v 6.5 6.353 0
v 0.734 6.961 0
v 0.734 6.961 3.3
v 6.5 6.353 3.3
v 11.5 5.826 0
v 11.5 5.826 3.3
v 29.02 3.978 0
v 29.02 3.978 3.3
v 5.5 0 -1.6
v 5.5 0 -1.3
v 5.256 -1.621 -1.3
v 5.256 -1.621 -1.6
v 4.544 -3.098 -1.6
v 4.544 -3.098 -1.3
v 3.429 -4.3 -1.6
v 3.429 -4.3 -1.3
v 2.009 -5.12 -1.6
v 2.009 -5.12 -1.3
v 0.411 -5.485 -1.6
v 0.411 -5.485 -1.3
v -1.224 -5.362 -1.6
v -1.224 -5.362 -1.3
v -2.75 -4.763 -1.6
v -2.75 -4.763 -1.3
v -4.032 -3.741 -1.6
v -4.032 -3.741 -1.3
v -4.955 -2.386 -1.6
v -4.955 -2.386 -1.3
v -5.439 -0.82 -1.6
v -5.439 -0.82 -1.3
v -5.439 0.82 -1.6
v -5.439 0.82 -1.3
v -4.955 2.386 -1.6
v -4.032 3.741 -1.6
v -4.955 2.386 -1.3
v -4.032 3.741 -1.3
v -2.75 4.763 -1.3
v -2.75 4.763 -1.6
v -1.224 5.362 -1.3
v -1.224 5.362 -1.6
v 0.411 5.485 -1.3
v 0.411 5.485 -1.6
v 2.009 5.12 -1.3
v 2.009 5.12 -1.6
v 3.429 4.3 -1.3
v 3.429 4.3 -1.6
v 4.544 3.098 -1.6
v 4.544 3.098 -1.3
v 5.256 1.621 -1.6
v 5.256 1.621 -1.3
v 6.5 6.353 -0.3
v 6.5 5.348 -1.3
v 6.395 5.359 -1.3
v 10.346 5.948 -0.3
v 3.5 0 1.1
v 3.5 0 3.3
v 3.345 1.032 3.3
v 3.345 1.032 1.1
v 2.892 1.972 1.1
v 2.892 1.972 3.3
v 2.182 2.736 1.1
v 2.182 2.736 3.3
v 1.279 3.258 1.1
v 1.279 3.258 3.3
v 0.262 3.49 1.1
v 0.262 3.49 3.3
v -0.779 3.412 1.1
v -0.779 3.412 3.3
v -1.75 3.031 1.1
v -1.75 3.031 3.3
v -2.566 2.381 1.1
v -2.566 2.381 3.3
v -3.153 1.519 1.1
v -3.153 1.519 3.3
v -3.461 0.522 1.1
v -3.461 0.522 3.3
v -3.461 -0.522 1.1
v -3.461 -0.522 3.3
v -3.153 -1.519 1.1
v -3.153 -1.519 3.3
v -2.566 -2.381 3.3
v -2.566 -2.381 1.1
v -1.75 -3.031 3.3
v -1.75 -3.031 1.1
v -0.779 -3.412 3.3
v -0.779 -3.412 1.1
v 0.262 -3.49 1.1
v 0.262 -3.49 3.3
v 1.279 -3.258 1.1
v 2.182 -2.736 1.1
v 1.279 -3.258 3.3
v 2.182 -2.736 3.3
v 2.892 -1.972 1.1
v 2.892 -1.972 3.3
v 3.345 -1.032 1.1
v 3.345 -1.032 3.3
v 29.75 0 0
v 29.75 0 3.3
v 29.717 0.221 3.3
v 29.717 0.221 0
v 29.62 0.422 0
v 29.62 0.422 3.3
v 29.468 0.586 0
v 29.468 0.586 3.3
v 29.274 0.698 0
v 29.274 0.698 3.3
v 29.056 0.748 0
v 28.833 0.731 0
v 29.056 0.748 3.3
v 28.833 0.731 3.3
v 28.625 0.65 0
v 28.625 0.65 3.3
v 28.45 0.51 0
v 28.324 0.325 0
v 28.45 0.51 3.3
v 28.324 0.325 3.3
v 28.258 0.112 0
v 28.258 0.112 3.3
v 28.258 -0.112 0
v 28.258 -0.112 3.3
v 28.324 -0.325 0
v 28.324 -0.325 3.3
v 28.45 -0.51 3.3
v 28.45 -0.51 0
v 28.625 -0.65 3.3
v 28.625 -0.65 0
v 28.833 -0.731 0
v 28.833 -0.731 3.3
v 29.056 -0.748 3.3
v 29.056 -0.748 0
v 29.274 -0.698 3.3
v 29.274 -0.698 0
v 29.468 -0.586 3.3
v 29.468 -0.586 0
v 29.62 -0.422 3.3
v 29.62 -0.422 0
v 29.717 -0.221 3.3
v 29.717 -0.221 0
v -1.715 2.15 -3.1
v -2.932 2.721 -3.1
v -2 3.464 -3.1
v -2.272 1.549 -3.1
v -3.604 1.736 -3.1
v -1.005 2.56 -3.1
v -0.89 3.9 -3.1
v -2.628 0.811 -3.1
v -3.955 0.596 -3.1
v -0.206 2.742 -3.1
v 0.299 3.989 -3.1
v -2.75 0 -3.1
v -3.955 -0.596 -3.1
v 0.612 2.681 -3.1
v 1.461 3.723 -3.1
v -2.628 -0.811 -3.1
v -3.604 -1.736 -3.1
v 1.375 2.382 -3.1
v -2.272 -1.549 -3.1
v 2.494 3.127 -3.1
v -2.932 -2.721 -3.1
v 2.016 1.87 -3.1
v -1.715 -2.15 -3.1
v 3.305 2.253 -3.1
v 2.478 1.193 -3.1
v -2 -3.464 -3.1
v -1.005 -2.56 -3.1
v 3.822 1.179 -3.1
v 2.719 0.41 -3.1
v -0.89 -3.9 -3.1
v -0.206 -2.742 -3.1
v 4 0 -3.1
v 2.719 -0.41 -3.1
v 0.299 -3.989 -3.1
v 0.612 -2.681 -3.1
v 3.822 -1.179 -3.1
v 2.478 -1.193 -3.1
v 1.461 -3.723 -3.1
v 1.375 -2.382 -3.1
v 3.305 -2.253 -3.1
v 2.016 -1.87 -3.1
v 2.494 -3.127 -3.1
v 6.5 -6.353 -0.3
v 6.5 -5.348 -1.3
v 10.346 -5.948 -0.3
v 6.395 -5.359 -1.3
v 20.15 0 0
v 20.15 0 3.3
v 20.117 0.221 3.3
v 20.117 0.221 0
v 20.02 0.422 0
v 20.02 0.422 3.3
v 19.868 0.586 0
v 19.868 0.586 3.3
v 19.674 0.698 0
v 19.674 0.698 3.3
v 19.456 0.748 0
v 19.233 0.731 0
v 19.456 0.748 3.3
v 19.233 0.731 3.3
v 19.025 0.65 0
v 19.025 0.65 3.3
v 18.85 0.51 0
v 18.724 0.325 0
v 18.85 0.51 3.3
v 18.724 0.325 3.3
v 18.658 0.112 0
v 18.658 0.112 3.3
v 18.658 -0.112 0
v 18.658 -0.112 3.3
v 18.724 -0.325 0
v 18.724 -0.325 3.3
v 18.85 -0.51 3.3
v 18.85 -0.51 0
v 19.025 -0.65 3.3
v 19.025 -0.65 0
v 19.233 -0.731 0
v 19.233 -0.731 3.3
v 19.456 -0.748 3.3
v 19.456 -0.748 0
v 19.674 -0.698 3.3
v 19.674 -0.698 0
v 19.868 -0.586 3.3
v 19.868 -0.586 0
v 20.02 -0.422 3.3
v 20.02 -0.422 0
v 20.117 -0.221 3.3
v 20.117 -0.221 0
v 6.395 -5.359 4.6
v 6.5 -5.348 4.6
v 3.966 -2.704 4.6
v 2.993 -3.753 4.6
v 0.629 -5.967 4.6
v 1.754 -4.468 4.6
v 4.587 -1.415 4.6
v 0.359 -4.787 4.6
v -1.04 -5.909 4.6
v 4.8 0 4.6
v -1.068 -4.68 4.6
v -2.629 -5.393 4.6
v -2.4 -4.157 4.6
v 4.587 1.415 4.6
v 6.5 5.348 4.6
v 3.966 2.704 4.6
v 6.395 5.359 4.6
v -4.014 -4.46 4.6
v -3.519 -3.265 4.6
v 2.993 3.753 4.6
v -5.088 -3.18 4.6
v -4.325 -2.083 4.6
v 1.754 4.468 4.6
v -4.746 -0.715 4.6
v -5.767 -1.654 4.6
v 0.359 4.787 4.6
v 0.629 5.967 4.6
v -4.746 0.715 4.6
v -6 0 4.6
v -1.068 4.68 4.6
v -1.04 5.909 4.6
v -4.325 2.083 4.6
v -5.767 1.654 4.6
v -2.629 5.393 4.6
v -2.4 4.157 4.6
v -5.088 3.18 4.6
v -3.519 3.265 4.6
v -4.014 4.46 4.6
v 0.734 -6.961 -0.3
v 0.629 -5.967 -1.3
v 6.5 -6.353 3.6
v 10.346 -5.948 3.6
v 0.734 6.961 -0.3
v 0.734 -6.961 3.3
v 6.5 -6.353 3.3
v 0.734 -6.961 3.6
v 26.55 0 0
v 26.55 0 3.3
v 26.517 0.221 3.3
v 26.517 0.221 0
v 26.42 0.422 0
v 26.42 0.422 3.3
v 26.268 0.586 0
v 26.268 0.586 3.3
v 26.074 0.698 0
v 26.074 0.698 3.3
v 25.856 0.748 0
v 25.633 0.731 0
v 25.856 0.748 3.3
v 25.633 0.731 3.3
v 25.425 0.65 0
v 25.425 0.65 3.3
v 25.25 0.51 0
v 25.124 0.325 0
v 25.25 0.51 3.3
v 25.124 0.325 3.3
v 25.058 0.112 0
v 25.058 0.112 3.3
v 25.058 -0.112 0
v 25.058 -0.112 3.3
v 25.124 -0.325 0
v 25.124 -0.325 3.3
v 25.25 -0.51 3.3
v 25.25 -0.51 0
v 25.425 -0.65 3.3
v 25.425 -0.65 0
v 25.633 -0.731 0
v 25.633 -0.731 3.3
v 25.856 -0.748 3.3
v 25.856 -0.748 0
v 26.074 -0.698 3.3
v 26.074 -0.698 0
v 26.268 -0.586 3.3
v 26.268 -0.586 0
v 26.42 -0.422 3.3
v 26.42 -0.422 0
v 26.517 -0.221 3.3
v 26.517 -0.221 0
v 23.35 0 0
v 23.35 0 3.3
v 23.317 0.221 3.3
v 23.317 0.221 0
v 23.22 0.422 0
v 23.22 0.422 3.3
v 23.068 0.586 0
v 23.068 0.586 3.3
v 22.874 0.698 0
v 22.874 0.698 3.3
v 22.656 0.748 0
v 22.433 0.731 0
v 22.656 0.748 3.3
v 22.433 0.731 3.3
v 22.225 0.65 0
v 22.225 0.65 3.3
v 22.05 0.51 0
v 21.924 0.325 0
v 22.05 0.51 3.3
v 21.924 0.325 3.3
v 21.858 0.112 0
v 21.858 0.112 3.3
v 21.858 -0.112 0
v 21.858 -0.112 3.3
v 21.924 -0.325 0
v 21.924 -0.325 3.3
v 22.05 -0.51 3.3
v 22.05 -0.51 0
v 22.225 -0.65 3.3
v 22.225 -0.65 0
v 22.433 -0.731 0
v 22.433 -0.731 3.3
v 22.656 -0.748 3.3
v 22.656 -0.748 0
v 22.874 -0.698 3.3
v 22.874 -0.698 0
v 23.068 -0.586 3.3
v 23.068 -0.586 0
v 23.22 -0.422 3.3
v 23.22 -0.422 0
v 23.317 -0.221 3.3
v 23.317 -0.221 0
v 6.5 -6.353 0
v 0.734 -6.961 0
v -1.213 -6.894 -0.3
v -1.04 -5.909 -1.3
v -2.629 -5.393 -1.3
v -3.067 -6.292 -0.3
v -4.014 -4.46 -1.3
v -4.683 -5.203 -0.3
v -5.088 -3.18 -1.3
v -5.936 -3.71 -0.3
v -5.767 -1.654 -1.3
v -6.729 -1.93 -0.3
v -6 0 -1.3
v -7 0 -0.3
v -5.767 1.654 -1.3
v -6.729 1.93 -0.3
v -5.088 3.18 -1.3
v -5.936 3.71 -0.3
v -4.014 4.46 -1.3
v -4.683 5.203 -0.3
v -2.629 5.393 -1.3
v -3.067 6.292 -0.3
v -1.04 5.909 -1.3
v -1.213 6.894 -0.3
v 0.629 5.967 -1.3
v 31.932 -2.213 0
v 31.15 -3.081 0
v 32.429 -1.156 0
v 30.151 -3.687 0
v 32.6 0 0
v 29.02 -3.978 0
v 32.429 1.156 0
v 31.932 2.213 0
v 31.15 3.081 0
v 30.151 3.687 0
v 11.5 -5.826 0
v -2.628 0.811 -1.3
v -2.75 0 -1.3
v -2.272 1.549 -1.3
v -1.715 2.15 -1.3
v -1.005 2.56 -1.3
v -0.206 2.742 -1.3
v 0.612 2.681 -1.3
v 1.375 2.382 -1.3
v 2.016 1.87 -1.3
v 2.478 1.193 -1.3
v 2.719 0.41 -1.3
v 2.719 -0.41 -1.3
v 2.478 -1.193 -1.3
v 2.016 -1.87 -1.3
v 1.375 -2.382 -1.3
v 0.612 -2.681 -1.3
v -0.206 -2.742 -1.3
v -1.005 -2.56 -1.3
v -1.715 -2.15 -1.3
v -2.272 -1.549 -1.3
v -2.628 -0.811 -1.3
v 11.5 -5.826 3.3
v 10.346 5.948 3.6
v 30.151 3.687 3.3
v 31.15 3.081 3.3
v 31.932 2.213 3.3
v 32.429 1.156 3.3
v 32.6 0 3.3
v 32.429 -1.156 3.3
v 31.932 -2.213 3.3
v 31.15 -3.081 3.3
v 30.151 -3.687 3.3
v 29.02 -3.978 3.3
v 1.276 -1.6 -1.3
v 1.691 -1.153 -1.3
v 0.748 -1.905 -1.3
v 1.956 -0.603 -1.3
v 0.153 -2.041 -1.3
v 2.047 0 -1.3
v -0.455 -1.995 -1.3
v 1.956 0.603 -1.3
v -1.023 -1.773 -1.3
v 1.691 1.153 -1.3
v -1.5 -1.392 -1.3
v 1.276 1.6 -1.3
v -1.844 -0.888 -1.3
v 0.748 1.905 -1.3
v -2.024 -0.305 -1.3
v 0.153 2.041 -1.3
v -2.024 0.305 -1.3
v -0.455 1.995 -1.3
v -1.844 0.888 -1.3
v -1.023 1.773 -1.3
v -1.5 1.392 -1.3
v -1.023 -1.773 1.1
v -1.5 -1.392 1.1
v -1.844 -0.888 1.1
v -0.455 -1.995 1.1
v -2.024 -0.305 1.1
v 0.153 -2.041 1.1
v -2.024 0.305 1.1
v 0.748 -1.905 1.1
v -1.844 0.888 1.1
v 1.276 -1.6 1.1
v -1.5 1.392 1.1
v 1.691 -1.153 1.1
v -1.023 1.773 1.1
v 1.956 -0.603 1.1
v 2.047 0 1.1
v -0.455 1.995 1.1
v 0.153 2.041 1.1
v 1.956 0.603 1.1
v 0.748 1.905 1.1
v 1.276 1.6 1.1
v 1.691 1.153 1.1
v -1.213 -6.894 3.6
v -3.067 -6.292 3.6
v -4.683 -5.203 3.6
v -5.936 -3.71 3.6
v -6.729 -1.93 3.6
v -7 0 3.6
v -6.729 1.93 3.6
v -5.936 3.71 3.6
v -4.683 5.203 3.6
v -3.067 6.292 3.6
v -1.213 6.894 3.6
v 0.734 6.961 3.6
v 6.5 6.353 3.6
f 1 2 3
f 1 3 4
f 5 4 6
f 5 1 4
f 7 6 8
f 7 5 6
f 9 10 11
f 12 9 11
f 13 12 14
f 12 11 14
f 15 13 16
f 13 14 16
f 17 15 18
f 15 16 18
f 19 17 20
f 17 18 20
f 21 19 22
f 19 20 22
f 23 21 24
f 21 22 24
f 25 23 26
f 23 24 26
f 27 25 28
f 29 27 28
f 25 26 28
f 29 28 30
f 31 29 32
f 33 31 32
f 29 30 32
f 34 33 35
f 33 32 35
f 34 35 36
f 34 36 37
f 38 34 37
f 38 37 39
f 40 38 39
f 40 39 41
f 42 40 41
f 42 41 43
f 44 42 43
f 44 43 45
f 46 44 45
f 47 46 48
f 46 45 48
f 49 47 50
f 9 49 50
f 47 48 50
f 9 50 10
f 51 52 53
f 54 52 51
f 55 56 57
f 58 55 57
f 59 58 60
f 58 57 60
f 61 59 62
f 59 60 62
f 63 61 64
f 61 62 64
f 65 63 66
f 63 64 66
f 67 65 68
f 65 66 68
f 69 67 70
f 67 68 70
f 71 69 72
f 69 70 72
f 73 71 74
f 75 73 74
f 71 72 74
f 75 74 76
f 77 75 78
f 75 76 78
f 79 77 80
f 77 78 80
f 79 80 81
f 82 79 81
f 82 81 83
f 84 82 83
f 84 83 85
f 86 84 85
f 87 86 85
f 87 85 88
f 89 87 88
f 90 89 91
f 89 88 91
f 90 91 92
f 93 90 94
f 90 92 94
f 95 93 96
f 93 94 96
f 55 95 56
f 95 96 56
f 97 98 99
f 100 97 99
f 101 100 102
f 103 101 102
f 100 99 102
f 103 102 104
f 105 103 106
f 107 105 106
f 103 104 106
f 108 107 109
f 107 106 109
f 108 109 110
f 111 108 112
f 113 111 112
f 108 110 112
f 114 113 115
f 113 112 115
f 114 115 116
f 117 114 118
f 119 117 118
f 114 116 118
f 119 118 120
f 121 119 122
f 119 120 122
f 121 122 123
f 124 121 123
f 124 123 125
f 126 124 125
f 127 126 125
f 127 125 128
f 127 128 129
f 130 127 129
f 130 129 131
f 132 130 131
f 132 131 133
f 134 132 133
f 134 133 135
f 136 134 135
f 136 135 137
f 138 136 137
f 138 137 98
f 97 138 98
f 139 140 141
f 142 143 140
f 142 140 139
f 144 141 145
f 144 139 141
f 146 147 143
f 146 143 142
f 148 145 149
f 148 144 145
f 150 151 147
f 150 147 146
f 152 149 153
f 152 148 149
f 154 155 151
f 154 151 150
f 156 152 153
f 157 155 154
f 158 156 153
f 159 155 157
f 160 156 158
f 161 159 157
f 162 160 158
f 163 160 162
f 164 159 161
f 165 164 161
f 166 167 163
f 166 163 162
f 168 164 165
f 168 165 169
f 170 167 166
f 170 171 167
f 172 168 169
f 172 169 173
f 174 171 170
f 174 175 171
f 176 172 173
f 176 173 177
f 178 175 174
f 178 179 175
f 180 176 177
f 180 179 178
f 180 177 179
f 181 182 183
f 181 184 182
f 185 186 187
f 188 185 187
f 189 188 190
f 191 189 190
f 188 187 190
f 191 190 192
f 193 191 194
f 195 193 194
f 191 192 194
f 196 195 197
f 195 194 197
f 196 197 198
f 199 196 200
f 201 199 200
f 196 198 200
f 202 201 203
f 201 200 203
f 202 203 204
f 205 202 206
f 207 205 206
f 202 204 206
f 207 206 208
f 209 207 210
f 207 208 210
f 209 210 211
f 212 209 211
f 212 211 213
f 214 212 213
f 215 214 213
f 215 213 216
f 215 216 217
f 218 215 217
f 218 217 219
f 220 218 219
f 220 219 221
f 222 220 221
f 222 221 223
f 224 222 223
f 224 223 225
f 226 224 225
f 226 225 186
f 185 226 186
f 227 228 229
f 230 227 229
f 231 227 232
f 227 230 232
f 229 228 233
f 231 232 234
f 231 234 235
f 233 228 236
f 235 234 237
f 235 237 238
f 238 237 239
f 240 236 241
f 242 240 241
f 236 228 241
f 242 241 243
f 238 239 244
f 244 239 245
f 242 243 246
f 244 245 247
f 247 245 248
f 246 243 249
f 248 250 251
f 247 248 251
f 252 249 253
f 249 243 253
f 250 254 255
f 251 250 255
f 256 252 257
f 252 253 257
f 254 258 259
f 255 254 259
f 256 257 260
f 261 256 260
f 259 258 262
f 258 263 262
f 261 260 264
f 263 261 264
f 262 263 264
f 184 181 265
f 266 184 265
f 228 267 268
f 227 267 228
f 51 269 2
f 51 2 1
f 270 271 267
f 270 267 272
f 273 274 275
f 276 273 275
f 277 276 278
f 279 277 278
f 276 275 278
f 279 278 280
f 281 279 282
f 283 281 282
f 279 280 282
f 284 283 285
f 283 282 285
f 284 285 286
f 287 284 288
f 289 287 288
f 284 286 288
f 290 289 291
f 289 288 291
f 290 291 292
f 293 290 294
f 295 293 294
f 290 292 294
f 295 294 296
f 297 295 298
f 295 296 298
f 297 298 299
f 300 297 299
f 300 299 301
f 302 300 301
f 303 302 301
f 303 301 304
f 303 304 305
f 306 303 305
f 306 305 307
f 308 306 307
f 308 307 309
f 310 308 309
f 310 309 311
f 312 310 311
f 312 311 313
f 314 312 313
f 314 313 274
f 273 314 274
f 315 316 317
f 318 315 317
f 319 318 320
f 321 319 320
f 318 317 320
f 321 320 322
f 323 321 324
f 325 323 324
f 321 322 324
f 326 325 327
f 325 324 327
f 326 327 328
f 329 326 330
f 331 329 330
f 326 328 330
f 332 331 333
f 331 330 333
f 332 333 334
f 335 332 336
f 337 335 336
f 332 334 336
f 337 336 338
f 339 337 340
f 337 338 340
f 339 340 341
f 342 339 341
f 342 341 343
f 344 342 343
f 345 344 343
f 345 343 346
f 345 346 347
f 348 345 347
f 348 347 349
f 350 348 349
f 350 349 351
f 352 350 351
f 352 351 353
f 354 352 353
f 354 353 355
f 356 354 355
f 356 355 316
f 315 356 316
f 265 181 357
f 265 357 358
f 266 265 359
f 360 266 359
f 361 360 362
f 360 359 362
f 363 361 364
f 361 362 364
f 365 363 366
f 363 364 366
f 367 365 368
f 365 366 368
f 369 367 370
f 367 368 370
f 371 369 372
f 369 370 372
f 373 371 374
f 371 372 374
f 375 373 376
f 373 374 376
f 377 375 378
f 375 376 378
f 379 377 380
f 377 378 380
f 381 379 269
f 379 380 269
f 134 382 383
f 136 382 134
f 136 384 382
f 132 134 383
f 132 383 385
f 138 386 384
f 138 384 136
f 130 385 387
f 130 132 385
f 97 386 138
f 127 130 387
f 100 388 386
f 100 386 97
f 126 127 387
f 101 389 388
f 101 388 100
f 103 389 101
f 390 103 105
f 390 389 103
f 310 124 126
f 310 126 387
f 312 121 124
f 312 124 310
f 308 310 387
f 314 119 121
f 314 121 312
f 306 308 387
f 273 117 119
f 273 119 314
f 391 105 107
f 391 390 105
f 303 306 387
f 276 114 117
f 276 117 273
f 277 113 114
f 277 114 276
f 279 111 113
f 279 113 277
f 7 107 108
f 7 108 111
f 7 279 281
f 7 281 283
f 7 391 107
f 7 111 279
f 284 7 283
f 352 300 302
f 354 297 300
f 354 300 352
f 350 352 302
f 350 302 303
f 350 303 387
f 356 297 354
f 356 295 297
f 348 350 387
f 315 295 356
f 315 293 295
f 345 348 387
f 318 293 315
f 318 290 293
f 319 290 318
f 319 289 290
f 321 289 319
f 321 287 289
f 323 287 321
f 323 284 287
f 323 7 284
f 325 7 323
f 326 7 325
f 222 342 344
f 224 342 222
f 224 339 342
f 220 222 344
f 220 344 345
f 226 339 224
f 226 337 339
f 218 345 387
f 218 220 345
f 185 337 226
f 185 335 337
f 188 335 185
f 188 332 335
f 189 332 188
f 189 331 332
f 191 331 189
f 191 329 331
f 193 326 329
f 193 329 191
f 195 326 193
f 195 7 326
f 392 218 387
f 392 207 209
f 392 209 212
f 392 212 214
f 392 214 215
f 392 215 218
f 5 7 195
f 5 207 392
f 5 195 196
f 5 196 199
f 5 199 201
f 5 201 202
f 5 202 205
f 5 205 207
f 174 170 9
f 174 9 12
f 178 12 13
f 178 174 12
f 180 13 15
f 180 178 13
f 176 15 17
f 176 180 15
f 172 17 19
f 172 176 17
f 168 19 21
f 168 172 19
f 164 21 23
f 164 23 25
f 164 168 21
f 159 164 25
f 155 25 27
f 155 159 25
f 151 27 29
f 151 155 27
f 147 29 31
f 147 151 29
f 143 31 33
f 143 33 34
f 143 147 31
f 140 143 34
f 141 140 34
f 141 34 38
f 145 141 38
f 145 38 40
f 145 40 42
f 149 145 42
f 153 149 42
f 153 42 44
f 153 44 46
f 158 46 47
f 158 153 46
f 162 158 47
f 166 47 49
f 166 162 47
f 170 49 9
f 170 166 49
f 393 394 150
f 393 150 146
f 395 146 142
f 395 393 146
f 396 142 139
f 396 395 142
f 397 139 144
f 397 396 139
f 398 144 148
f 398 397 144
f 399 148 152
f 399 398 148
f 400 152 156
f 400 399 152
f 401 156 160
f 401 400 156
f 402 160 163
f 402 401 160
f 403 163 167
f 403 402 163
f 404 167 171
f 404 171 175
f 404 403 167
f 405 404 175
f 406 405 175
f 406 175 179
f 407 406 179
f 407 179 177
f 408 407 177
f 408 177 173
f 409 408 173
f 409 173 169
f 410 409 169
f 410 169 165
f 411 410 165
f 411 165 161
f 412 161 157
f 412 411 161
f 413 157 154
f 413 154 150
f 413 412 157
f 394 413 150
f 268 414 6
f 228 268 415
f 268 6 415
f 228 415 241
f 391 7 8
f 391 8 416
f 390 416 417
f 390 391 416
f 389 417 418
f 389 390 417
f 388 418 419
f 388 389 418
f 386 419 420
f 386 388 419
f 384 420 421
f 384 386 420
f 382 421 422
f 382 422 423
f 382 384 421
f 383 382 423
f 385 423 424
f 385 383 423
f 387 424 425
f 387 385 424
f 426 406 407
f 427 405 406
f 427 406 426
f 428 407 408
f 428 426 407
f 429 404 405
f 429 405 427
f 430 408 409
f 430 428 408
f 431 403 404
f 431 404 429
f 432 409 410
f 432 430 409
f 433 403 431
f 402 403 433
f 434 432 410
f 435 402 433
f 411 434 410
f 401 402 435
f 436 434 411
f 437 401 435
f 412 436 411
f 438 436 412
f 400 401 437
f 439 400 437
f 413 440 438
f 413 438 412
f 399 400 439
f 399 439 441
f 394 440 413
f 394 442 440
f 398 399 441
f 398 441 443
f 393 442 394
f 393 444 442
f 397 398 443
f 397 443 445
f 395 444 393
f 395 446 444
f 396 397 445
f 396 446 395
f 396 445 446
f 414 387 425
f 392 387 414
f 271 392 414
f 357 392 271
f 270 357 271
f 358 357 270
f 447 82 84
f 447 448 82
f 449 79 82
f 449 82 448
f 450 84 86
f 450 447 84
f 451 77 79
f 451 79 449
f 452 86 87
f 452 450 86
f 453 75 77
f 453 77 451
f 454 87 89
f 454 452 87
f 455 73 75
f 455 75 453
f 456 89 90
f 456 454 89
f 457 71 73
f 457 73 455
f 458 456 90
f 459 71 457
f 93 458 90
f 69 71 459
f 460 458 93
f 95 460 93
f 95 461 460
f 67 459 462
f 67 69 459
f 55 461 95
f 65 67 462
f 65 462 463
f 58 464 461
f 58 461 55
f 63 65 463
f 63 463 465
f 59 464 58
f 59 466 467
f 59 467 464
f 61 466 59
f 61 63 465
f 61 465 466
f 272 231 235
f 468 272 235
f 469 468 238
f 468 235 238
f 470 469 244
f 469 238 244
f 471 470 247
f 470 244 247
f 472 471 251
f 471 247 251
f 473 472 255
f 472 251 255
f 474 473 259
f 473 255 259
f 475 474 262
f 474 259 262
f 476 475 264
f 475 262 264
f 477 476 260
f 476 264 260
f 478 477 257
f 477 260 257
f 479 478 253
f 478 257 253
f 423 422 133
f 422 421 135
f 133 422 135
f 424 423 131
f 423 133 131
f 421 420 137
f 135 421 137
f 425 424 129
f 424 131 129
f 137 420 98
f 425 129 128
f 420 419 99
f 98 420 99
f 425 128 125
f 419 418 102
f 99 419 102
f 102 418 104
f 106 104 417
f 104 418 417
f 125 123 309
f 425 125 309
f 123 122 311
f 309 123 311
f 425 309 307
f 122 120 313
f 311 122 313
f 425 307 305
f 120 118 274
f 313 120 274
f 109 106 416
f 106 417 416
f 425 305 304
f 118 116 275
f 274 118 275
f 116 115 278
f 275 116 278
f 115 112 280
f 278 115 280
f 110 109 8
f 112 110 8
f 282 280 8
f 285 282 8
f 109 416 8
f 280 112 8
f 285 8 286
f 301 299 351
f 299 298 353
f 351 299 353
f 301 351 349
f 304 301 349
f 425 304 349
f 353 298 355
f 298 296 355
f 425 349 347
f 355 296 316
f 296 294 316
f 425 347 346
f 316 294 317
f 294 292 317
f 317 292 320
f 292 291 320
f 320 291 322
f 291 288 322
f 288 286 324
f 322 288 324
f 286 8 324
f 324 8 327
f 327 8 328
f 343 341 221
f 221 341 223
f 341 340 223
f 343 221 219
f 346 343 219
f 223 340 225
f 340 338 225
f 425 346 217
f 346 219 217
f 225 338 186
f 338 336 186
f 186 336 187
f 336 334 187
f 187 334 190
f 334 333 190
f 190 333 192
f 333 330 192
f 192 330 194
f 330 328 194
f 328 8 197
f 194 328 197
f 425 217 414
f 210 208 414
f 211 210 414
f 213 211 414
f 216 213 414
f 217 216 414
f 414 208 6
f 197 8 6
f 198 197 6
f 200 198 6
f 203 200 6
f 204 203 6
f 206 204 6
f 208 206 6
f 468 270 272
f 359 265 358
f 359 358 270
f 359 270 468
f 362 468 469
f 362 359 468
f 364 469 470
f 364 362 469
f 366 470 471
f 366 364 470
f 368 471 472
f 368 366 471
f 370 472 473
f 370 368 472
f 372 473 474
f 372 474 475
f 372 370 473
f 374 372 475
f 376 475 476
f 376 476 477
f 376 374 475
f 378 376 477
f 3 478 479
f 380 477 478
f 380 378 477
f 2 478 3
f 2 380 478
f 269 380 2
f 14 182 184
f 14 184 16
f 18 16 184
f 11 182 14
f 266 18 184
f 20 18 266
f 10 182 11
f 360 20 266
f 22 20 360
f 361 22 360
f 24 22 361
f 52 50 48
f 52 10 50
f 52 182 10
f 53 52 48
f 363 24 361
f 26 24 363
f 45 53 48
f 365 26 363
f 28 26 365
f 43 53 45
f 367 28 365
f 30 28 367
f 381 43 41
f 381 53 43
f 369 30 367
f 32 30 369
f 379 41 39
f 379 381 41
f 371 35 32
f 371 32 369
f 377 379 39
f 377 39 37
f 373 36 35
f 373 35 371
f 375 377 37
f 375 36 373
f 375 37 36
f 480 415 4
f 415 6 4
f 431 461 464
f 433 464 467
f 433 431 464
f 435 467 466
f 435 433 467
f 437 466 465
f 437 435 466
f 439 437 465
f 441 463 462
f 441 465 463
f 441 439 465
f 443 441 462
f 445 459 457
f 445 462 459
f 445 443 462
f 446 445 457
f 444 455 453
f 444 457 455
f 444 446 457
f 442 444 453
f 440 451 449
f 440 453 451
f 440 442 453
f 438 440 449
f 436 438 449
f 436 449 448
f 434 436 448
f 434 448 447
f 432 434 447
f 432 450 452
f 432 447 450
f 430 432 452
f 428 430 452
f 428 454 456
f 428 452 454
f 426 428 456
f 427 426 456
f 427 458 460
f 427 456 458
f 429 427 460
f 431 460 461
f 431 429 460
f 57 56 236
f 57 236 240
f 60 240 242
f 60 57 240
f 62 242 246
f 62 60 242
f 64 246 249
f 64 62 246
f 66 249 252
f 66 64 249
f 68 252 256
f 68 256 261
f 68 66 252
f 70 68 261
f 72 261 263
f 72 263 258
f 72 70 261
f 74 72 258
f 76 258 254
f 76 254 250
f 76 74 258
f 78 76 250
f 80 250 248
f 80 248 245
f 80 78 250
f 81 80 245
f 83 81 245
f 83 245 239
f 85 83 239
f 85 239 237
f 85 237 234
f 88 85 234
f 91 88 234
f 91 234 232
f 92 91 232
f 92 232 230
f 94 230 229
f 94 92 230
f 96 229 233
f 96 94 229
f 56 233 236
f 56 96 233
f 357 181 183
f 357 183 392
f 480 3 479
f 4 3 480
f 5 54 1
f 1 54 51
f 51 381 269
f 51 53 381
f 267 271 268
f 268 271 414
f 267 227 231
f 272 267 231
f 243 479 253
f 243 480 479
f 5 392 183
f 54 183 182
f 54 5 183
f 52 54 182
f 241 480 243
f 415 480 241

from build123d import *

# Parameters (mm, degrees)
ESQUISSE1_R             = 2.046773471
BOSS_EXTRU_1_DEPTH      = 3.3
BOSS_EXTRU_2_DEPTH      = 1.3
BOSS_EXTRU_2_DEPTH_BACK = 4.6
ESQUISSE2_R             = 2.046773471
CHANFREIN1_SIZE         = 5
CHANFREIN1_SIZE_2       = 1.3
CHANFREIN3_SIZE         = 5
CHANFREIN3_SIZE_2       = 1.3
CHANFREIN2_SIZE         = 1
ESQUISSE3_R             = 5.5
ESQUISSE3_R_2           = 2.75
BOSS_EXTRU_3_DEPTH      = 1.8
CHANFREIN4_SIZE         = 1.5
ESQUISSE4_R             = 3.5
ENL_V_MAT_EXTRU_1_DEPTH = 3.5
CHANFREIN5_SIZE         = 1.3
ESQUISSE5_R             = 0.75
ENL_V_MAT_EXTRU_2_DEPTH = 3.5


with BuildPart() as part:
    # Esquisse1 → Boss.-Extru.1 (new body)
    with BuildSketch(Plane.XY):
        with BuildLine():
            Line((0.734265734, 6.96138304), (29.01958042, 3.977933166))
            ThreePointArc((29.01958042, 3.977933166), (32.6, 0), (29.01958042, -3.977933166))
            Line((29.01958042, -3.977933166), (0.734265734, -6.96138304))
            ThreePointArc((0.734265734, -6.96138304), (-7, 0), (0.734265734, 6.96138304))
        make_face()
        Circle(ESQUISSE1_R, mode=Mode.SUBTRACT)
    extrude(amount=BOSS_EXTRU_1_DEPTH)

    # Esquisse2 → Boss.-Extru.2 (add, two sides: drawn at the far end of the back side and taken through both)
    with BuildSketch(Plane.XY.offset(3.3).offset(-BOSS_EXTRU_2_DEPTH_BACK)):
        with BuildLine():
            Line((0.734265734, 6.96138304), (6.5, 6.353230741))
            Line((6.5, 6.353230741), (6.5, -6.353230741))
            Line((6.5, -6.353230741), (0.734265734, -6.96138304))
            ThreePointArc((0.734265734, -6.96138304), (-7, 0), (0.734265734, 6.96138304))
        make_face()
        Circle(ESQUISSE2_R, mode=Mode.SUBTRACT)
    extrude(amount=BOSS_EXTRU_2_DEPTH + BOSS_EXTRU_2_DEPTH_BACK)

    # Chanfrein1
    # the kernel refuses this chamfer: 5, 1.3 mm, written as the material it adds along each edge
    with BuildSketch(Plane(origin=(6.5, 19.337751576, 3.3), x_dir=(0.9999530531472482, 0, -0.009689762716214913), z_dir=(0, -1, 0))) as chanfrein1_piece_1_section:
        Polygon((CHANFREIN1_SIZE * 0.999953053147, CHANFREIN1_SIZE * 0.00968976271621), (-CHANFREIN1_SIZE_2 * 0.00968976271621, CHANFREIN1_SIZE_2 * 0.999953053147), (0, 0), align=None)
    chanfrein1_piece_1 = extrude(amount=38.675503153, mode=Mode.PRIVATE)
    chanfrein1_piece_1 = split(chanfrein1_piece_1, bisect_by=Plane(origin=(8.862365218, 6.104055566, 3.683257133), z_dir=(-0.10489510489510492, -0.994483291447898, 0)), keep=Keep.TOP, mode=Mode.PRIVATE)
    chanfrein1_piece_1 = split(chanfrein1_piece_1, bisect_by=Plane(origin=(8.862365218, -6.104055566, 3.683257133), z_dir=(-0.10489510489510483, 0.9944832914478982, 0)), keep=Keep.TOP, mode=Mode.PRIVATE)
    chanfrein1_piece_1 = split(chanfrein1_piece_1, bisect_by=Plane(origin=(8.218527805, 0, 4.6), z_dir=(0, 0, -1)), keep=Keep.TOP, mode=Mode.PRIVATE)
    add(chanfrein1_piece_1)

    # Chanfrein3
    # the kernel refuses this chamfer: 5, 1.3 mm, written as the material it adds along each edge
    with BuildSketch(Plane(origin=(6.5, 19.337751576, 0), x_dir=(0.9999530531472482, 0, 0.009689762716214958), z_dir=(0, -1, 0))) as chanfrein3_piece_1_section:
        Polygon((CHANFREIN3_SIZE * 0.999953053147, -CHANFREIN3_SIZE * 0.00968976271621), (-CHANFREIN3_SIZE_2 * 0.00968976271621, -CHANFREIN3_SIZE_2 * 0.999953053147), (0, 0), align=None)
    chanfrein3_piece_1 = extrude(amount=38.675503153, mode=Mode.PRIVATE)
    chanfrein3_piece_1 = split(chanfrein3_piece_1, bisect_by=Plane(origin=(8.862365218, 6.104055566, -0.383257133), z_dir=(-0.10489510489499053, -0.9944832914479101, 0)), keep=Keep.TOP, mode=Mode.PRIVATE)
    chanfrein3_piece_1 = split(chanfrein3_piece_1, bisect_by=Plane(origin=(8.862365218, -6.104055566, -0.383257133), z_dir=(-0.10489510489499053, 0.9944832914479101, 0)), keep=Keep.TOP, mode=Mode.PRIVATE)
    chanfrein3_piece_1 = split(chanfrein3_piece_1, bisect_by=Plane(origin=(8.218527805, 0, -1.3), z_dir=(0, 0, 1)), keep=Keep.TOP, mode=Mode.PRIVATE)
    add(chanfrein3_piece_1)

    # Chanfrein2
    chanfrein2_edges = [part.edges().sort_by_distance(p)[0] for p in [
        (-7, 0, -1.3),
        (3.617132867, 6.65730689, -1.3),
        (3.617132867, -6.65730689, -1.3),
        (-7, 0, 4.6),
        (3.617132867, -6.65730689, 4.6),
        (3.617132867, 6.65730689, 4.6),
    ]]
    chamfer(chanfrein2_edges, length=CHANFREIN2_SIZE)

    # Esquisse3 → Boss.-Extru.3 (add)
    with BuildSketch(Plane(origin=(0, 0, -1.3), x_dir=(-1, 0, 0), z_dir=(0, 0, -1))):
        with Locations(Location((0, 0, 0), (0, 0, 180))):
            Circle(ESQUISSE3_R)
        Circle(ESQUISSE3_R_2, mode=Mode.SUBTRACT)
    extrude(amount=BOSS_EXTRU_3_DEPTH)

    # Chanfrein4
    chanfrein4_edges = [part.edges().sort_by_distance(p)[0] for p in [
        (-5.5, 0, -3.1),
    ]]
    chamfer(chanfrein4_edges, length=CHANFREIN4_SIZE)

    # Esquisse4 → Enlèv. mat.-Extru.1 (cut)
    with BuildSketch(Plane.XY.offset(4.6)):
        Circle(ESQUISSE4_R)
    extrude(amount=-ENL_V_MAT_EXTRU_1_DEPTH, mode=Mode.SUBTRACT)

    # Chanfrein5
    chanfrein5_edges = [part.edges().sort_by_distance(p)[0] for p in [
        (-3.5, 0, 4.6),
    ]]
    chamfer(chanfrein5_edges, length=CHANFREIN5_SIZE)

    # Esquisse5 → Enlèv. mat.-Extru.2 (cut)
    with BuildSketch(Plane.XY.offset(3.3)):
        with Locations((29, 0)):
            Circle(ESQUISSE5_R)
        with Locations((25.8, 0)):
            Circle(ESQUISSE5_R)
        with Locations((22.6, 0)):
            Circle(ESQUISSE5_R)
        with Locations((19.4, 0)):
            Circle(ESQUISSE5_R)
    extrude(amount=-ENL_V_MAT_EXTRU_2_DEPTH, mode=Mode.SUBTRACT)


solid = part.part
